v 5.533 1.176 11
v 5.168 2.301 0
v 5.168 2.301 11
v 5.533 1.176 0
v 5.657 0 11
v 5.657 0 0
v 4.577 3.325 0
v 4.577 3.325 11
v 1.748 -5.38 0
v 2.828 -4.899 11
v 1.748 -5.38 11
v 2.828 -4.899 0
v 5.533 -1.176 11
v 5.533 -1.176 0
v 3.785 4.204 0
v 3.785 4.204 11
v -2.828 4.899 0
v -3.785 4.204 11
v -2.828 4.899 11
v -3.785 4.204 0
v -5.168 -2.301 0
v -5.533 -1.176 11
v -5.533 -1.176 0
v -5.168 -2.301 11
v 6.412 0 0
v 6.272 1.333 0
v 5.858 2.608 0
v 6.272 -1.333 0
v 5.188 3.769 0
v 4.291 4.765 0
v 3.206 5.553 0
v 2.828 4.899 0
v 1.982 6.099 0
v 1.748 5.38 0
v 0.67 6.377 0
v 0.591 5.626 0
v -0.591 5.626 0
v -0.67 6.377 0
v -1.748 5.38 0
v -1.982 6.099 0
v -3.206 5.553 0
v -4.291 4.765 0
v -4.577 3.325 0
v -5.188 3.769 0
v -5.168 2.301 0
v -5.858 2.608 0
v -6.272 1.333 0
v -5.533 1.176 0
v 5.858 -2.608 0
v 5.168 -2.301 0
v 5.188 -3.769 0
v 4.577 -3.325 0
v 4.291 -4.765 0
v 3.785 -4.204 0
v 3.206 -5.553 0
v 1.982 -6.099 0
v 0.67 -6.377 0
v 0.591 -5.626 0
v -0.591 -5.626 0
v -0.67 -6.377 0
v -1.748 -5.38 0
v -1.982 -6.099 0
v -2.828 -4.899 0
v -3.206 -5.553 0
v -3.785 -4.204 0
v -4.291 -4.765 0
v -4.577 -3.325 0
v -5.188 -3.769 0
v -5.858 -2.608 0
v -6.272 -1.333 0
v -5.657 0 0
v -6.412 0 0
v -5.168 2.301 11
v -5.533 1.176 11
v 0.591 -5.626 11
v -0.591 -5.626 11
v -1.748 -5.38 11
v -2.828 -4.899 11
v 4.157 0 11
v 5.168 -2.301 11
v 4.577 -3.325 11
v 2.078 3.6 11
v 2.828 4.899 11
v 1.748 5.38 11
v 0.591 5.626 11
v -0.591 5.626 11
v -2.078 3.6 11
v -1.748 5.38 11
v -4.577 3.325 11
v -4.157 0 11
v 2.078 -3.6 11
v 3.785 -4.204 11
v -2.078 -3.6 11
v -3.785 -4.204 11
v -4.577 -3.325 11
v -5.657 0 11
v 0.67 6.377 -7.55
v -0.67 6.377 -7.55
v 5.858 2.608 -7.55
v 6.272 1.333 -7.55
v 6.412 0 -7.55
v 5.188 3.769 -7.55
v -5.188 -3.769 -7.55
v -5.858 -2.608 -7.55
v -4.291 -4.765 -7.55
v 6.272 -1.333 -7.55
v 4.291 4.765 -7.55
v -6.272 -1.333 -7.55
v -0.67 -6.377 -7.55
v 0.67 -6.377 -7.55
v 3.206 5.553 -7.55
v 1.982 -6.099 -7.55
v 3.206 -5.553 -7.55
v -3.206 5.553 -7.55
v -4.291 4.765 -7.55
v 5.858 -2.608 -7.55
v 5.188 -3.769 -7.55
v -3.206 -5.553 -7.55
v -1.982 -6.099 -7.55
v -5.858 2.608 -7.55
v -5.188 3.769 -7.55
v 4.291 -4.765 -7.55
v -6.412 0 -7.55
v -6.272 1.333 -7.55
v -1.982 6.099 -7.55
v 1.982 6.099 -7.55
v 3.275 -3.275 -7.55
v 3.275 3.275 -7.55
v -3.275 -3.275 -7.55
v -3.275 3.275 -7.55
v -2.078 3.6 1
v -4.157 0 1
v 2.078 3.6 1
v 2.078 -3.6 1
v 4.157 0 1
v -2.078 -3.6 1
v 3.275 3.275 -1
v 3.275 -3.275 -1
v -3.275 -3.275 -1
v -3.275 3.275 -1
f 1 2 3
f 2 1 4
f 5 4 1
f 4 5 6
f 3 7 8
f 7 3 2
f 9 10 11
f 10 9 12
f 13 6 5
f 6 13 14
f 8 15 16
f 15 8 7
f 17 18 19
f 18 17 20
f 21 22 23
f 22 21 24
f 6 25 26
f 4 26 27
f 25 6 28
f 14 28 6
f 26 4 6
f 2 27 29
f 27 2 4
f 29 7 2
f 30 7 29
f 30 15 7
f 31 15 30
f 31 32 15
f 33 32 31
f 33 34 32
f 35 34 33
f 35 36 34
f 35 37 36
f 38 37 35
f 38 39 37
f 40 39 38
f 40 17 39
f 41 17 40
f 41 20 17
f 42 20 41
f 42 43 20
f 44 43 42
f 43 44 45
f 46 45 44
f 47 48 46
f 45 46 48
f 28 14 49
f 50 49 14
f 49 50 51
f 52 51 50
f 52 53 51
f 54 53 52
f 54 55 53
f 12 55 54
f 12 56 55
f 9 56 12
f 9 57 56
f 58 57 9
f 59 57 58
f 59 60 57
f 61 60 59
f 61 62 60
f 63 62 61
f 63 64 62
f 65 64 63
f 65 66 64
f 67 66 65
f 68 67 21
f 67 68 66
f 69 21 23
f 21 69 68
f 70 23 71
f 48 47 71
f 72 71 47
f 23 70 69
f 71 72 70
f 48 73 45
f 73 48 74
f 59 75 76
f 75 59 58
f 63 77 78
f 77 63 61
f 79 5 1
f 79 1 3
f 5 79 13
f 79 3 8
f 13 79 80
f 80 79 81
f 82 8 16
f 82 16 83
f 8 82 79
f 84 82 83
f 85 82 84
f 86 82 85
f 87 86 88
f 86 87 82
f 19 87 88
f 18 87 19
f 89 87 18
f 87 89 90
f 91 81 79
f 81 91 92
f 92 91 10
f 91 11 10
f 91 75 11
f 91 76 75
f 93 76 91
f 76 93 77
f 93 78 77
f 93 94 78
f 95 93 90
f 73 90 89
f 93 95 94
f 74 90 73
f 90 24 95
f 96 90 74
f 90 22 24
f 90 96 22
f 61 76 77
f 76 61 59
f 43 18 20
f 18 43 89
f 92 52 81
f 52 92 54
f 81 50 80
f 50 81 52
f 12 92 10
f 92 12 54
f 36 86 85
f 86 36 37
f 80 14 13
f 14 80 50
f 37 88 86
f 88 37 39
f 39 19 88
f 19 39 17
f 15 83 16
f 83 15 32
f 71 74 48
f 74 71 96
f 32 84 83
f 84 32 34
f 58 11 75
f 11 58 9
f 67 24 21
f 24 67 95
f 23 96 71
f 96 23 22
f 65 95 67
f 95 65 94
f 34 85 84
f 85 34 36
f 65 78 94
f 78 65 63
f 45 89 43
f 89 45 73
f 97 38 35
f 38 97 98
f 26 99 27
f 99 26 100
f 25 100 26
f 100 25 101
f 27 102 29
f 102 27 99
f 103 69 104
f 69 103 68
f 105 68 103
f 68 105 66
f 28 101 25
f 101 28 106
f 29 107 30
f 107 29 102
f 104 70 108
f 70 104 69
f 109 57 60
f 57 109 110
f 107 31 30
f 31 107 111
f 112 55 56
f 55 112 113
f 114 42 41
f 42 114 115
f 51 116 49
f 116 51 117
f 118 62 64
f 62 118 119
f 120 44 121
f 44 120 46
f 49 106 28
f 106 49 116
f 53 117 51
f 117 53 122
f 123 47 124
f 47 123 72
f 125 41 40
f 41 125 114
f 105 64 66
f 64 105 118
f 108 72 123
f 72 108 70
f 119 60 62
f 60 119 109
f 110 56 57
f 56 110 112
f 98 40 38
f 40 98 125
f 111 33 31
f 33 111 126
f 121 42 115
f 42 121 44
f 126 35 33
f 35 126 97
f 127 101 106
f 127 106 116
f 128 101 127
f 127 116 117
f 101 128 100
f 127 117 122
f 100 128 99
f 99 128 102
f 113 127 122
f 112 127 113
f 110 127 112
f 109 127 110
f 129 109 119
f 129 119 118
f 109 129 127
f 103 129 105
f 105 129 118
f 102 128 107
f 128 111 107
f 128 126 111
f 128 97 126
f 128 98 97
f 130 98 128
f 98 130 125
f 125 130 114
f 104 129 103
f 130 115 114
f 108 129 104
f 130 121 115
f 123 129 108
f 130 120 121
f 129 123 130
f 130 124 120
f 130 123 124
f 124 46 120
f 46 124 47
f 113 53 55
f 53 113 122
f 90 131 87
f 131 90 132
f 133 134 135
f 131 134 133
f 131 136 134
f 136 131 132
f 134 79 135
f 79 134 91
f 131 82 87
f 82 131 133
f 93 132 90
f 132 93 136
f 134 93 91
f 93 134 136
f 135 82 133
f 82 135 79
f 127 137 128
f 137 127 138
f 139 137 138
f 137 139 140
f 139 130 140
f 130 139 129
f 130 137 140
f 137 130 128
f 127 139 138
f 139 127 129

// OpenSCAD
//Hex socket (customizable)

// diameter of hole across-flats
size = 7;
// size of drive
drive = 6.35; // [6.35:1/4", 9.525:3/8", 12.7:1/2", 19.05:3/4", 25.4:1"]
// depth of socket
depth = 10;
// drive and socket size tolerance
tolerance = 0.2;

tolSize = size + tolerance;
inscribedSize = tolSize/0.866025;
tolDrive = drive + tolerance;

socketRadius = (inscribedSize+3)/2;
driveRadius = ((tolDrive*1.5)+3)/2;

difference()
{
	union()
	{
		//socket portion
		translate([0,0,(depth+1)/2])
		cylinder(h = depth + 1, r = socketRadius, center = true, $fn = 30);

		//drive portion
		translate([0,0,0-((tolDrive + 1) / 2)])
		cylinder(h = tolDrive + 1, r = driveRadius, center = true, $fn = 30);
	}
	
	//socket hole
	translate([0,0,1])
	linear_extrude(height = depth, center = false)
	circle(r = inscribedSize/2, $fn = 6);

	//drive hole
	translate([0,0,0-(tolDrive/2)-1])
	cube(size = tolDrive, center = true);
}
